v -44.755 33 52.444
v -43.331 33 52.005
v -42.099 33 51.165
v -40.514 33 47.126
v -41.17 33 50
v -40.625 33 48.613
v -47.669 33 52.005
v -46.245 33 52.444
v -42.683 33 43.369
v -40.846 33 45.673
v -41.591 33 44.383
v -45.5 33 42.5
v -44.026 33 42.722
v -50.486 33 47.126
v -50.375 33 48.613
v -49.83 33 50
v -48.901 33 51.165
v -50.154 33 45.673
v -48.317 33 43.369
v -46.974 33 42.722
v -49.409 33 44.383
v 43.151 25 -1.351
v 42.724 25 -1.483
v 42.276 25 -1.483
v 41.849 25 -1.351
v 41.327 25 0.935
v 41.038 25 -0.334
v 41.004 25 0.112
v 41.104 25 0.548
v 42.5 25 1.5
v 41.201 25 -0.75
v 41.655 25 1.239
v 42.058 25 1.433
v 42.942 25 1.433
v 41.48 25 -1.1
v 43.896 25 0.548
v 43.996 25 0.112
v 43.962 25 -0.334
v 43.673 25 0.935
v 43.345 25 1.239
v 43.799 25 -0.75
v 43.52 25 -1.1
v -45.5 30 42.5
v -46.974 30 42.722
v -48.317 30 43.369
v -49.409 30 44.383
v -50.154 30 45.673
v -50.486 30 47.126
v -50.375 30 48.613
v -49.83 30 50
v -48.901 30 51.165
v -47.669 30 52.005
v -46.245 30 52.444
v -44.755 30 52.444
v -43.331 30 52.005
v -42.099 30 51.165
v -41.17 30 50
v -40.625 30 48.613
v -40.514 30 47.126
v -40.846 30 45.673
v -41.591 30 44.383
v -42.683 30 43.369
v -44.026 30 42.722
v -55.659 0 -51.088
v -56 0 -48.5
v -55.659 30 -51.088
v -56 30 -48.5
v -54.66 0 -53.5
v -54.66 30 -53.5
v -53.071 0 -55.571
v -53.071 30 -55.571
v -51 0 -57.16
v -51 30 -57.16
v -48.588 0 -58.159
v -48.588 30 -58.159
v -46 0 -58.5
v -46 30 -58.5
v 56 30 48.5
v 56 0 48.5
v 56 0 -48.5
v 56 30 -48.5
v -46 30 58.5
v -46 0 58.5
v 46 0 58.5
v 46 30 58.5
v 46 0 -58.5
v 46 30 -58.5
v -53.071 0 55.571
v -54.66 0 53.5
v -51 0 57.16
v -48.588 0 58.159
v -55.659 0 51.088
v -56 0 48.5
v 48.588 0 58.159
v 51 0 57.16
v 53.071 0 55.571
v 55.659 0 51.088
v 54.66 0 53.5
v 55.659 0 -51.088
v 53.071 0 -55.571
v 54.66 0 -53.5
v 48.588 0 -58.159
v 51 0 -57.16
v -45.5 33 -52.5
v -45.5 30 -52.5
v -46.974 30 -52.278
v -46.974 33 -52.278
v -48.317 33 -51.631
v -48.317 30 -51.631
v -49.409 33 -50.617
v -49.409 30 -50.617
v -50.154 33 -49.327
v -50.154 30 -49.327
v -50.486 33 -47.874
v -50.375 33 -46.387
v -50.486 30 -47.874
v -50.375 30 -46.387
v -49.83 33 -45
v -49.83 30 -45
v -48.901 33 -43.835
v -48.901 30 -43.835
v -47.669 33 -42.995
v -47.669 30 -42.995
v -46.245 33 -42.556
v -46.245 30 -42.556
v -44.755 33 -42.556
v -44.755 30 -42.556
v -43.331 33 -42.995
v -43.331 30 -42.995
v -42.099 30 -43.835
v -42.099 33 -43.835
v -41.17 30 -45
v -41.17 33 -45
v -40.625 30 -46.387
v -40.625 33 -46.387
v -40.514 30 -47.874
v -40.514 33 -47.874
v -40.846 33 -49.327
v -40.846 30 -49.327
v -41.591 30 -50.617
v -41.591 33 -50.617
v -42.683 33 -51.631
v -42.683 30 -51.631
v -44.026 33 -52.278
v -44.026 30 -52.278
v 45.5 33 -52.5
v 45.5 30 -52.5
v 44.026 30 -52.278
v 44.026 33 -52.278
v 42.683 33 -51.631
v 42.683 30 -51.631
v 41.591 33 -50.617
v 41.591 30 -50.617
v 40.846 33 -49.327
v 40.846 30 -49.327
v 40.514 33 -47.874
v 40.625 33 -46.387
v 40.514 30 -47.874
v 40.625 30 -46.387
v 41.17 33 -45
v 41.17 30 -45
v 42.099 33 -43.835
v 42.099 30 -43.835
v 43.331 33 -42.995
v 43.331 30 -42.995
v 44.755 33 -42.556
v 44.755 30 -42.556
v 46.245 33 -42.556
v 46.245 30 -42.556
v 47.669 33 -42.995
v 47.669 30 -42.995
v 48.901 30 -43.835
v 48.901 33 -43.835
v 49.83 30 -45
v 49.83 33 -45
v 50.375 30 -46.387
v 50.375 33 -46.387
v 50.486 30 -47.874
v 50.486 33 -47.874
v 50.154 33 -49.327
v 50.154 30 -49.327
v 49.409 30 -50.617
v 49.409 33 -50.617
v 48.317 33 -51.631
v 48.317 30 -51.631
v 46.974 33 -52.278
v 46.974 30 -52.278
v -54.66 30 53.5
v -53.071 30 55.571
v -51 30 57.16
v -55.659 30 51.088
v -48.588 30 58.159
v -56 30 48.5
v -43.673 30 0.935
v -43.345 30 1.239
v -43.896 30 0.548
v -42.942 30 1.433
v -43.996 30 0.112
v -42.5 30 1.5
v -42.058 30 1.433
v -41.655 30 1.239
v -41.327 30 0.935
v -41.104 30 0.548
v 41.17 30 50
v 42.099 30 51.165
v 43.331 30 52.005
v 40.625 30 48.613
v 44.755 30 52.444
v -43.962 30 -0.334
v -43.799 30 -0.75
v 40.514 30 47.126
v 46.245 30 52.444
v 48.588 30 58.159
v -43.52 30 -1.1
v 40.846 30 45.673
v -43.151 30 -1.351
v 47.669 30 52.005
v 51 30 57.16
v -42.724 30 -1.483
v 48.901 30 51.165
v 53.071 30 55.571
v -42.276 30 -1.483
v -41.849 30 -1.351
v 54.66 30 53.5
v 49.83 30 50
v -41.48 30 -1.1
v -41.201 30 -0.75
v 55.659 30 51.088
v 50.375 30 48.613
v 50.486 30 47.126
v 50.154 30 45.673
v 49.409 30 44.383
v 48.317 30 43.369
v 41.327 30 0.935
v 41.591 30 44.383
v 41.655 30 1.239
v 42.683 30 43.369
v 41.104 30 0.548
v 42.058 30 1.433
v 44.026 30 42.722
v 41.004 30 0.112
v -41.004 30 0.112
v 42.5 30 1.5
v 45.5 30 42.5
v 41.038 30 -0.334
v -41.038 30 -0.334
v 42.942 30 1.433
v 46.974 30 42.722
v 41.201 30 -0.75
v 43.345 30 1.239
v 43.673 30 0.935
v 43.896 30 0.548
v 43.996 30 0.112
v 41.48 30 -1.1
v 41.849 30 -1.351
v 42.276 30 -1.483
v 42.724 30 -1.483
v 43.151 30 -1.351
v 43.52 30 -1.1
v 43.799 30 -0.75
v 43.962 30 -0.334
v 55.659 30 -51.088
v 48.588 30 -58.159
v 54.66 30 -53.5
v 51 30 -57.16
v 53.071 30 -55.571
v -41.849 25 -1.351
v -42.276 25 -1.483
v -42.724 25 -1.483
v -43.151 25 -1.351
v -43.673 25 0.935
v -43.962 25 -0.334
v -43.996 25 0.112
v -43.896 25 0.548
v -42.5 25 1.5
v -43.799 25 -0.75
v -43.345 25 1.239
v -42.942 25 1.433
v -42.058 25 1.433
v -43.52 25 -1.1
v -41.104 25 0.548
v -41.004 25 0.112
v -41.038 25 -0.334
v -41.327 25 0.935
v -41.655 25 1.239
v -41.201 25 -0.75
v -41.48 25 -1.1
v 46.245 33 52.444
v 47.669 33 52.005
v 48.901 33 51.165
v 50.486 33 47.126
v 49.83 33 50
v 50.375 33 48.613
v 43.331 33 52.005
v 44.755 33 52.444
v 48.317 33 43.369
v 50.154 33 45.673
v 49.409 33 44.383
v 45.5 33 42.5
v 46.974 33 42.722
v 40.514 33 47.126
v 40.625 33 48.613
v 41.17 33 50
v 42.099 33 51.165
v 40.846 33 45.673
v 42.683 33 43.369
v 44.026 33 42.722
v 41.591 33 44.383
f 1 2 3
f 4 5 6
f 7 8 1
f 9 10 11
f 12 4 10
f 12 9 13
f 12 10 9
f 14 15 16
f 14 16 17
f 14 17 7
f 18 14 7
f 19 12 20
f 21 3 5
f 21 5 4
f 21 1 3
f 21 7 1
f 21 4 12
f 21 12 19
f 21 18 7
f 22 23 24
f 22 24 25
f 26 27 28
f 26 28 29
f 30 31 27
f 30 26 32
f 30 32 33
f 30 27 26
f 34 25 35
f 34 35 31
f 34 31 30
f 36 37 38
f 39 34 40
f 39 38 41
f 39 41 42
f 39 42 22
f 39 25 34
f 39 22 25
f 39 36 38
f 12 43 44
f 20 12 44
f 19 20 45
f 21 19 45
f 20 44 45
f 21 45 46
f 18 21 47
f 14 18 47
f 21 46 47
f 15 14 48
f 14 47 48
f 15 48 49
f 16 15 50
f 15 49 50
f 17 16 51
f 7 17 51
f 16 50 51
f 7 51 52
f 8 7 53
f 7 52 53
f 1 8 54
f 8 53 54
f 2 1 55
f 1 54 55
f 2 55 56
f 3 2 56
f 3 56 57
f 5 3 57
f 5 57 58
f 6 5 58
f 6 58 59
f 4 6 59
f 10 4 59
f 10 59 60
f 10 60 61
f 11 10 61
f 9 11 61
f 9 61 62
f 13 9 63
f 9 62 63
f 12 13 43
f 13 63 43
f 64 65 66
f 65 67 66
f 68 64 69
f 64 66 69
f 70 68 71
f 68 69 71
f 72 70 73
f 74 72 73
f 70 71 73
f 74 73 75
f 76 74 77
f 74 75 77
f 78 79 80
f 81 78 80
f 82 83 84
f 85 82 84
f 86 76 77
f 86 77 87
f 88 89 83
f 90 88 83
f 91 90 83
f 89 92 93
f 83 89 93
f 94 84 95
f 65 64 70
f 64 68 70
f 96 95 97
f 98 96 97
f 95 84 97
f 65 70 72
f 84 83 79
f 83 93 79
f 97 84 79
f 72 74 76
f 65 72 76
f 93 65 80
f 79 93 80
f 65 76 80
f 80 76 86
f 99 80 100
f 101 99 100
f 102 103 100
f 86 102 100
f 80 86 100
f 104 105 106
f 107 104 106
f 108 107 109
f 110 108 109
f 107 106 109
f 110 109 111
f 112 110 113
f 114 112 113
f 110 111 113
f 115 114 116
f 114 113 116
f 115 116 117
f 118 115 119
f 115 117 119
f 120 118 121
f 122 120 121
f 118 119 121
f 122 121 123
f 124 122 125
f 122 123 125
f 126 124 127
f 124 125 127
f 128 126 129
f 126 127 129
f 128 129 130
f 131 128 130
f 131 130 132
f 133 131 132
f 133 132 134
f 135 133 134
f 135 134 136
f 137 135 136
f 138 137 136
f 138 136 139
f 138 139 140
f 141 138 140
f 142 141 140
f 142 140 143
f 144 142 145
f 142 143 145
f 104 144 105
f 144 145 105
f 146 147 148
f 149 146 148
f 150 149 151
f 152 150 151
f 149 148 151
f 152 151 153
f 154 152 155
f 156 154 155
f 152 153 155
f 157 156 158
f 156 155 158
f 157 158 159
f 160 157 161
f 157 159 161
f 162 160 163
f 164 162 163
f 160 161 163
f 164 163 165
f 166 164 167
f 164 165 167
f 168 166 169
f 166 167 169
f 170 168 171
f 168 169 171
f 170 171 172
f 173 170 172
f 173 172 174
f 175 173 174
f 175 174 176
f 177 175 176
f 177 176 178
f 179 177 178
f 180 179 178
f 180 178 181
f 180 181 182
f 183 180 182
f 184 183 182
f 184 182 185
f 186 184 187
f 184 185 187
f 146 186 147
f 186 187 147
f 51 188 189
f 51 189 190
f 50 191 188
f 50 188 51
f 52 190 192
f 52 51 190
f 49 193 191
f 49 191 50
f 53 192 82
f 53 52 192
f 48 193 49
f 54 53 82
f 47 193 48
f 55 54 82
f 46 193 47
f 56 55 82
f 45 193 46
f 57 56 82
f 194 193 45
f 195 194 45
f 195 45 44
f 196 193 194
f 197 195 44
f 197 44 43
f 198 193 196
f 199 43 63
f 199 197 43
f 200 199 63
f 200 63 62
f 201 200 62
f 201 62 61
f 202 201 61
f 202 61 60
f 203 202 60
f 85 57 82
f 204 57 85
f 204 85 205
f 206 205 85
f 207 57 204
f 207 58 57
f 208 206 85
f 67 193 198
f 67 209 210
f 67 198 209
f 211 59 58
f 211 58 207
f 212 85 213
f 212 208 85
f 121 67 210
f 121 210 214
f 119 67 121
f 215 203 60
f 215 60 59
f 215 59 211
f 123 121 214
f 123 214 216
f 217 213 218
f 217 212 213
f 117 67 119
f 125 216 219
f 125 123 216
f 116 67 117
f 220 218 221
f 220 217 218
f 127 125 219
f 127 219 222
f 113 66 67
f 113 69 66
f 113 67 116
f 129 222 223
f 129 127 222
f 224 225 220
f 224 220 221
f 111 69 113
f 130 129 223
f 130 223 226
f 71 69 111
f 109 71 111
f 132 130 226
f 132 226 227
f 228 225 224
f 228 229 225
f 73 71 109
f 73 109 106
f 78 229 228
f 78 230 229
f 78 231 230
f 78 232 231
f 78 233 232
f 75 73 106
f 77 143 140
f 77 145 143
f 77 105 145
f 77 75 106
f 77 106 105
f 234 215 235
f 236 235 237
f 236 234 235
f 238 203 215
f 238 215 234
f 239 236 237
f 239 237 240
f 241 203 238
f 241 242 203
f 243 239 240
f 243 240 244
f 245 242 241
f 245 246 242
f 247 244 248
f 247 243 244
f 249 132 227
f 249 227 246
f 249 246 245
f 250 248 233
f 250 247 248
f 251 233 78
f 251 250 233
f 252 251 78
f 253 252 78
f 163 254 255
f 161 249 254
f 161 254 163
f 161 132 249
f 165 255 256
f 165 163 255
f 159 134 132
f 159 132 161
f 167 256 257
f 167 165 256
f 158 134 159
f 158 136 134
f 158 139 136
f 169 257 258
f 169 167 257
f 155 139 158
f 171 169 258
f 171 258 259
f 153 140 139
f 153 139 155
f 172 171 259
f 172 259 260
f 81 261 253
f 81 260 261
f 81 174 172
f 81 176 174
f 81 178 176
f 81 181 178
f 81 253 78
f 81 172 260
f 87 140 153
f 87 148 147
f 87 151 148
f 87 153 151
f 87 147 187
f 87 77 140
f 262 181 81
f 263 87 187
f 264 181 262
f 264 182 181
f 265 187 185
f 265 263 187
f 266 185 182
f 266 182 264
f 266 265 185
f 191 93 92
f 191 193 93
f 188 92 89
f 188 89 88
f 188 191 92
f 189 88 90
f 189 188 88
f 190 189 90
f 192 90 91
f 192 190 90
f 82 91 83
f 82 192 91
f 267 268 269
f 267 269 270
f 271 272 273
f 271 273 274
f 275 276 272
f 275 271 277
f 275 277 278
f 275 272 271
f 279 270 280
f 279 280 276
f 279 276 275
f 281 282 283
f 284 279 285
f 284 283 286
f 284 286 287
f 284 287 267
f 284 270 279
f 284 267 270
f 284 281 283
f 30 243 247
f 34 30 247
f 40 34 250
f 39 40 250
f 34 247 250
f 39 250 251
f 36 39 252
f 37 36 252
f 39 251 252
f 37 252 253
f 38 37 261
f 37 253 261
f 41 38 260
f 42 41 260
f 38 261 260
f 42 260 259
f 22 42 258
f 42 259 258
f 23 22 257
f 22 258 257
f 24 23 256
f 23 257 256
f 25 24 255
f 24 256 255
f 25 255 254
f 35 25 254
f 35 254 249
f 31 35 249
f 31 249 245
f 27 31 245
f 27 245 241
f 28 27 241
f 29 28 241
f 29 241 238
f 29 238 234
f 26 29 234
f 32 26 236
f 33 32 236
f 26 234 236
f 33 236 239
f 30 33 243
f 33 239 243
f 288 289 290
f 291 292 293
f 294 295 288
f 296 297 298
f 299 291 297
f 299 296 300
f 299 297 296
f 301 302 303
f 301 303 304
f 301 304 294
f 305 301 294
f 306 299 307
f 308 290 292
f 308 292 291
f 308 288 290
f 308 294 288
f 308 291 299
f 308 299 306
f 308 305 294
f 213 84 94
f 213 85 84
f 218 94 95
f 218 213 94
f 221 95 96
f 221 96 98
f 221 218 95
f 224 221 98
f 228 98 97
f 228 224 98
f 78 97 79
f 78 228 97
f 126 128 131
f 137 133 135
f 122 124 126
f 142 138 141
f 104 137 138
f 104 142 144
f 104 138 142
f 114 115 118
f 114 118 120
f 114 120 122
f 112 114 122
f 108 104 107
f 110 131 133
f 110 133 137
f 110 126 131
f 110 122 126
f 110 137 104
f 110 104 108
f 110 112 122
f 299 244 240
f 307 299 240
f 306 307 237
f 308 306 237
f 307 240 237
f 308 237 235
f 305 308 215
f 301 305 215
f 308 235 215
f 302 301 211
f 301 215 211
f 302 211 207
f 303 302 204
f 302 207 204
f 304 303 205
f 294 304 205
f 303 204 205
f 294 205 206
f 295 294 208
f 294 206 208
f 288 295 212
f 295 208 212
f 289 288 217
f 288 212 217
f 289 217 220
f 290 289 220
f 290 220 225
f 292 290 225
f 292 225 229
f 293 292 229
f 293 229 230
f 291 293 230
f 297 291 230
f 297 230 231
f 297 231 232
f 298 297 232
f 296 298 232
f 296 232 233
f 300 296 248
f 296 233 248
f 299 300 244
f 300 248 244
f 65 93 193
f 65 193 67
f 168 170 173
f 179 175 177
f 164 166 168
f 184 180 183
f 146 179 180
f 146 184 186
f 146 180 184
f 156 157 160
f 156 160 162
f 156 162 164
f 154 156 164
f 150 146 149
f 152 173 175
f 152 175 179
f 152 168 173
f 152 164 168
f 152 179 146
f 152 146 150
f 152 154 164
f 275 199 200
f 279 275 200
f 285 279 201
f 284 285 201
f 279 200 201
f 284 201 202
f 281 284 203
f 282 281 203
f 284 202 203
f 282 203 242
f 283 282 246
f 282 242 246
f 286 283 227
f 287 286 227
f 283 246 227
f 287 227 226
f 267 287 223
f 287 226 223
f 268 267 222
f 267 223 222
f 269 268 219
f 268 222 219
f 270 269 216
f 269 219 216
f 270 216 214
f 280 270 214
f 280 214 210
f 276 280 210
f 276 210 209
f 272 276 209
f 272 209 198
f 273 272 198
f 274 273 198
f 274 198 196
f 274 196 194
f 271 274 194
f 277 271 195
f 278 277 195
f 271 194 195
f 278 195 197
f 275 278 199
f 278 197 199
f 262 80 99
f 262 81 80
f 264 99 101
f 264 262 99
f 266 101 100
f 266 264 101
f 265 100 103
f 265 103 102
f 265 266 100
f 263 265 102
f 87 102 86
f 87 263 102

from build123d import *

# Parameters (mm, degrees)
SKETCH_1_W          = 112
SKETCH_1_H          = 117
EXTRUDE_1_DEPTH     = 30
FILLET_1_R          = 10
SKETCH_2_R          = 5
EXTRUDE_2_DEPTH     = 3
SKETCH_3_R          = 1.5
CUT_EXTRUDE_1_DEPTH = 5


with BuildPart() as part:
    # 草图1 → 凸台-拉伸1 (new body)
    with BuildSketch(Plane(origin=(0, 0, 0), x_dir=(1, 0, 0), z_dir=(0, 1, 0))):
        Rectangle(SKETCH_1_W, SKETCH_1_H)
    extrude(amount=EXTRUDE_1_DEPTH)

    # 圆角1
    fillet_1_edges = [part.edges().sort_by_distance(p)[0] for p in [
        (56, 15, 58.5),
        (-56, 15, 58.5),
        (-56, 15, -58.5),
        (56, 15, -58.5),
    ]]
    fillet(fillet_1_edges, radius=FILLET_1_R)

    # 草图2 → 凸台-拉伸2 (add)
    with BuildSketch(Plane(origin=(0, 30, 0), x_dir=(1, 0, 0), z_dir=(0, 1, 0))):
        with Locations(Location((-45.5, 47.5, 0), (0, 0, 90))):
            Circle(SKETCH_2_R)
        with Locations(Location((45.5, 47.5, 0), (0, 0, 90))):
            Circle(SKETCH_2_R)
        with Locations(Location((-45.5, -47.5, 0), (0, 0, 90))):
            Circle(SKETCH_2_R)
        with Locations(Location((45.5, -47.5, 0), (0, 0, 90))):
            Circle(SKETCH_2_R)
    extrude(amount=EXTRUDE_2_DEPTH)

    # 草图3 → 切除-拉伸1 (cut)
    with BuildSketch(Plane(origin=(0, 30, 0), x_dir=(1, 0, 0), z_dir=(0, 1, 0))):
        with Locations(Location((-42.5, 0, 0), (0, 0, 270))):
            Circle(SKETCH_3_R)
        with Locations(Location((42.5, 0, 0), (0, 0, 270))):
            Circle(SKETCH_3_R)
    extrude(amount=-CUT_EXTRUDE_1_DEPTH, mode=Mode.SUBTRACT)


solid = part.part
